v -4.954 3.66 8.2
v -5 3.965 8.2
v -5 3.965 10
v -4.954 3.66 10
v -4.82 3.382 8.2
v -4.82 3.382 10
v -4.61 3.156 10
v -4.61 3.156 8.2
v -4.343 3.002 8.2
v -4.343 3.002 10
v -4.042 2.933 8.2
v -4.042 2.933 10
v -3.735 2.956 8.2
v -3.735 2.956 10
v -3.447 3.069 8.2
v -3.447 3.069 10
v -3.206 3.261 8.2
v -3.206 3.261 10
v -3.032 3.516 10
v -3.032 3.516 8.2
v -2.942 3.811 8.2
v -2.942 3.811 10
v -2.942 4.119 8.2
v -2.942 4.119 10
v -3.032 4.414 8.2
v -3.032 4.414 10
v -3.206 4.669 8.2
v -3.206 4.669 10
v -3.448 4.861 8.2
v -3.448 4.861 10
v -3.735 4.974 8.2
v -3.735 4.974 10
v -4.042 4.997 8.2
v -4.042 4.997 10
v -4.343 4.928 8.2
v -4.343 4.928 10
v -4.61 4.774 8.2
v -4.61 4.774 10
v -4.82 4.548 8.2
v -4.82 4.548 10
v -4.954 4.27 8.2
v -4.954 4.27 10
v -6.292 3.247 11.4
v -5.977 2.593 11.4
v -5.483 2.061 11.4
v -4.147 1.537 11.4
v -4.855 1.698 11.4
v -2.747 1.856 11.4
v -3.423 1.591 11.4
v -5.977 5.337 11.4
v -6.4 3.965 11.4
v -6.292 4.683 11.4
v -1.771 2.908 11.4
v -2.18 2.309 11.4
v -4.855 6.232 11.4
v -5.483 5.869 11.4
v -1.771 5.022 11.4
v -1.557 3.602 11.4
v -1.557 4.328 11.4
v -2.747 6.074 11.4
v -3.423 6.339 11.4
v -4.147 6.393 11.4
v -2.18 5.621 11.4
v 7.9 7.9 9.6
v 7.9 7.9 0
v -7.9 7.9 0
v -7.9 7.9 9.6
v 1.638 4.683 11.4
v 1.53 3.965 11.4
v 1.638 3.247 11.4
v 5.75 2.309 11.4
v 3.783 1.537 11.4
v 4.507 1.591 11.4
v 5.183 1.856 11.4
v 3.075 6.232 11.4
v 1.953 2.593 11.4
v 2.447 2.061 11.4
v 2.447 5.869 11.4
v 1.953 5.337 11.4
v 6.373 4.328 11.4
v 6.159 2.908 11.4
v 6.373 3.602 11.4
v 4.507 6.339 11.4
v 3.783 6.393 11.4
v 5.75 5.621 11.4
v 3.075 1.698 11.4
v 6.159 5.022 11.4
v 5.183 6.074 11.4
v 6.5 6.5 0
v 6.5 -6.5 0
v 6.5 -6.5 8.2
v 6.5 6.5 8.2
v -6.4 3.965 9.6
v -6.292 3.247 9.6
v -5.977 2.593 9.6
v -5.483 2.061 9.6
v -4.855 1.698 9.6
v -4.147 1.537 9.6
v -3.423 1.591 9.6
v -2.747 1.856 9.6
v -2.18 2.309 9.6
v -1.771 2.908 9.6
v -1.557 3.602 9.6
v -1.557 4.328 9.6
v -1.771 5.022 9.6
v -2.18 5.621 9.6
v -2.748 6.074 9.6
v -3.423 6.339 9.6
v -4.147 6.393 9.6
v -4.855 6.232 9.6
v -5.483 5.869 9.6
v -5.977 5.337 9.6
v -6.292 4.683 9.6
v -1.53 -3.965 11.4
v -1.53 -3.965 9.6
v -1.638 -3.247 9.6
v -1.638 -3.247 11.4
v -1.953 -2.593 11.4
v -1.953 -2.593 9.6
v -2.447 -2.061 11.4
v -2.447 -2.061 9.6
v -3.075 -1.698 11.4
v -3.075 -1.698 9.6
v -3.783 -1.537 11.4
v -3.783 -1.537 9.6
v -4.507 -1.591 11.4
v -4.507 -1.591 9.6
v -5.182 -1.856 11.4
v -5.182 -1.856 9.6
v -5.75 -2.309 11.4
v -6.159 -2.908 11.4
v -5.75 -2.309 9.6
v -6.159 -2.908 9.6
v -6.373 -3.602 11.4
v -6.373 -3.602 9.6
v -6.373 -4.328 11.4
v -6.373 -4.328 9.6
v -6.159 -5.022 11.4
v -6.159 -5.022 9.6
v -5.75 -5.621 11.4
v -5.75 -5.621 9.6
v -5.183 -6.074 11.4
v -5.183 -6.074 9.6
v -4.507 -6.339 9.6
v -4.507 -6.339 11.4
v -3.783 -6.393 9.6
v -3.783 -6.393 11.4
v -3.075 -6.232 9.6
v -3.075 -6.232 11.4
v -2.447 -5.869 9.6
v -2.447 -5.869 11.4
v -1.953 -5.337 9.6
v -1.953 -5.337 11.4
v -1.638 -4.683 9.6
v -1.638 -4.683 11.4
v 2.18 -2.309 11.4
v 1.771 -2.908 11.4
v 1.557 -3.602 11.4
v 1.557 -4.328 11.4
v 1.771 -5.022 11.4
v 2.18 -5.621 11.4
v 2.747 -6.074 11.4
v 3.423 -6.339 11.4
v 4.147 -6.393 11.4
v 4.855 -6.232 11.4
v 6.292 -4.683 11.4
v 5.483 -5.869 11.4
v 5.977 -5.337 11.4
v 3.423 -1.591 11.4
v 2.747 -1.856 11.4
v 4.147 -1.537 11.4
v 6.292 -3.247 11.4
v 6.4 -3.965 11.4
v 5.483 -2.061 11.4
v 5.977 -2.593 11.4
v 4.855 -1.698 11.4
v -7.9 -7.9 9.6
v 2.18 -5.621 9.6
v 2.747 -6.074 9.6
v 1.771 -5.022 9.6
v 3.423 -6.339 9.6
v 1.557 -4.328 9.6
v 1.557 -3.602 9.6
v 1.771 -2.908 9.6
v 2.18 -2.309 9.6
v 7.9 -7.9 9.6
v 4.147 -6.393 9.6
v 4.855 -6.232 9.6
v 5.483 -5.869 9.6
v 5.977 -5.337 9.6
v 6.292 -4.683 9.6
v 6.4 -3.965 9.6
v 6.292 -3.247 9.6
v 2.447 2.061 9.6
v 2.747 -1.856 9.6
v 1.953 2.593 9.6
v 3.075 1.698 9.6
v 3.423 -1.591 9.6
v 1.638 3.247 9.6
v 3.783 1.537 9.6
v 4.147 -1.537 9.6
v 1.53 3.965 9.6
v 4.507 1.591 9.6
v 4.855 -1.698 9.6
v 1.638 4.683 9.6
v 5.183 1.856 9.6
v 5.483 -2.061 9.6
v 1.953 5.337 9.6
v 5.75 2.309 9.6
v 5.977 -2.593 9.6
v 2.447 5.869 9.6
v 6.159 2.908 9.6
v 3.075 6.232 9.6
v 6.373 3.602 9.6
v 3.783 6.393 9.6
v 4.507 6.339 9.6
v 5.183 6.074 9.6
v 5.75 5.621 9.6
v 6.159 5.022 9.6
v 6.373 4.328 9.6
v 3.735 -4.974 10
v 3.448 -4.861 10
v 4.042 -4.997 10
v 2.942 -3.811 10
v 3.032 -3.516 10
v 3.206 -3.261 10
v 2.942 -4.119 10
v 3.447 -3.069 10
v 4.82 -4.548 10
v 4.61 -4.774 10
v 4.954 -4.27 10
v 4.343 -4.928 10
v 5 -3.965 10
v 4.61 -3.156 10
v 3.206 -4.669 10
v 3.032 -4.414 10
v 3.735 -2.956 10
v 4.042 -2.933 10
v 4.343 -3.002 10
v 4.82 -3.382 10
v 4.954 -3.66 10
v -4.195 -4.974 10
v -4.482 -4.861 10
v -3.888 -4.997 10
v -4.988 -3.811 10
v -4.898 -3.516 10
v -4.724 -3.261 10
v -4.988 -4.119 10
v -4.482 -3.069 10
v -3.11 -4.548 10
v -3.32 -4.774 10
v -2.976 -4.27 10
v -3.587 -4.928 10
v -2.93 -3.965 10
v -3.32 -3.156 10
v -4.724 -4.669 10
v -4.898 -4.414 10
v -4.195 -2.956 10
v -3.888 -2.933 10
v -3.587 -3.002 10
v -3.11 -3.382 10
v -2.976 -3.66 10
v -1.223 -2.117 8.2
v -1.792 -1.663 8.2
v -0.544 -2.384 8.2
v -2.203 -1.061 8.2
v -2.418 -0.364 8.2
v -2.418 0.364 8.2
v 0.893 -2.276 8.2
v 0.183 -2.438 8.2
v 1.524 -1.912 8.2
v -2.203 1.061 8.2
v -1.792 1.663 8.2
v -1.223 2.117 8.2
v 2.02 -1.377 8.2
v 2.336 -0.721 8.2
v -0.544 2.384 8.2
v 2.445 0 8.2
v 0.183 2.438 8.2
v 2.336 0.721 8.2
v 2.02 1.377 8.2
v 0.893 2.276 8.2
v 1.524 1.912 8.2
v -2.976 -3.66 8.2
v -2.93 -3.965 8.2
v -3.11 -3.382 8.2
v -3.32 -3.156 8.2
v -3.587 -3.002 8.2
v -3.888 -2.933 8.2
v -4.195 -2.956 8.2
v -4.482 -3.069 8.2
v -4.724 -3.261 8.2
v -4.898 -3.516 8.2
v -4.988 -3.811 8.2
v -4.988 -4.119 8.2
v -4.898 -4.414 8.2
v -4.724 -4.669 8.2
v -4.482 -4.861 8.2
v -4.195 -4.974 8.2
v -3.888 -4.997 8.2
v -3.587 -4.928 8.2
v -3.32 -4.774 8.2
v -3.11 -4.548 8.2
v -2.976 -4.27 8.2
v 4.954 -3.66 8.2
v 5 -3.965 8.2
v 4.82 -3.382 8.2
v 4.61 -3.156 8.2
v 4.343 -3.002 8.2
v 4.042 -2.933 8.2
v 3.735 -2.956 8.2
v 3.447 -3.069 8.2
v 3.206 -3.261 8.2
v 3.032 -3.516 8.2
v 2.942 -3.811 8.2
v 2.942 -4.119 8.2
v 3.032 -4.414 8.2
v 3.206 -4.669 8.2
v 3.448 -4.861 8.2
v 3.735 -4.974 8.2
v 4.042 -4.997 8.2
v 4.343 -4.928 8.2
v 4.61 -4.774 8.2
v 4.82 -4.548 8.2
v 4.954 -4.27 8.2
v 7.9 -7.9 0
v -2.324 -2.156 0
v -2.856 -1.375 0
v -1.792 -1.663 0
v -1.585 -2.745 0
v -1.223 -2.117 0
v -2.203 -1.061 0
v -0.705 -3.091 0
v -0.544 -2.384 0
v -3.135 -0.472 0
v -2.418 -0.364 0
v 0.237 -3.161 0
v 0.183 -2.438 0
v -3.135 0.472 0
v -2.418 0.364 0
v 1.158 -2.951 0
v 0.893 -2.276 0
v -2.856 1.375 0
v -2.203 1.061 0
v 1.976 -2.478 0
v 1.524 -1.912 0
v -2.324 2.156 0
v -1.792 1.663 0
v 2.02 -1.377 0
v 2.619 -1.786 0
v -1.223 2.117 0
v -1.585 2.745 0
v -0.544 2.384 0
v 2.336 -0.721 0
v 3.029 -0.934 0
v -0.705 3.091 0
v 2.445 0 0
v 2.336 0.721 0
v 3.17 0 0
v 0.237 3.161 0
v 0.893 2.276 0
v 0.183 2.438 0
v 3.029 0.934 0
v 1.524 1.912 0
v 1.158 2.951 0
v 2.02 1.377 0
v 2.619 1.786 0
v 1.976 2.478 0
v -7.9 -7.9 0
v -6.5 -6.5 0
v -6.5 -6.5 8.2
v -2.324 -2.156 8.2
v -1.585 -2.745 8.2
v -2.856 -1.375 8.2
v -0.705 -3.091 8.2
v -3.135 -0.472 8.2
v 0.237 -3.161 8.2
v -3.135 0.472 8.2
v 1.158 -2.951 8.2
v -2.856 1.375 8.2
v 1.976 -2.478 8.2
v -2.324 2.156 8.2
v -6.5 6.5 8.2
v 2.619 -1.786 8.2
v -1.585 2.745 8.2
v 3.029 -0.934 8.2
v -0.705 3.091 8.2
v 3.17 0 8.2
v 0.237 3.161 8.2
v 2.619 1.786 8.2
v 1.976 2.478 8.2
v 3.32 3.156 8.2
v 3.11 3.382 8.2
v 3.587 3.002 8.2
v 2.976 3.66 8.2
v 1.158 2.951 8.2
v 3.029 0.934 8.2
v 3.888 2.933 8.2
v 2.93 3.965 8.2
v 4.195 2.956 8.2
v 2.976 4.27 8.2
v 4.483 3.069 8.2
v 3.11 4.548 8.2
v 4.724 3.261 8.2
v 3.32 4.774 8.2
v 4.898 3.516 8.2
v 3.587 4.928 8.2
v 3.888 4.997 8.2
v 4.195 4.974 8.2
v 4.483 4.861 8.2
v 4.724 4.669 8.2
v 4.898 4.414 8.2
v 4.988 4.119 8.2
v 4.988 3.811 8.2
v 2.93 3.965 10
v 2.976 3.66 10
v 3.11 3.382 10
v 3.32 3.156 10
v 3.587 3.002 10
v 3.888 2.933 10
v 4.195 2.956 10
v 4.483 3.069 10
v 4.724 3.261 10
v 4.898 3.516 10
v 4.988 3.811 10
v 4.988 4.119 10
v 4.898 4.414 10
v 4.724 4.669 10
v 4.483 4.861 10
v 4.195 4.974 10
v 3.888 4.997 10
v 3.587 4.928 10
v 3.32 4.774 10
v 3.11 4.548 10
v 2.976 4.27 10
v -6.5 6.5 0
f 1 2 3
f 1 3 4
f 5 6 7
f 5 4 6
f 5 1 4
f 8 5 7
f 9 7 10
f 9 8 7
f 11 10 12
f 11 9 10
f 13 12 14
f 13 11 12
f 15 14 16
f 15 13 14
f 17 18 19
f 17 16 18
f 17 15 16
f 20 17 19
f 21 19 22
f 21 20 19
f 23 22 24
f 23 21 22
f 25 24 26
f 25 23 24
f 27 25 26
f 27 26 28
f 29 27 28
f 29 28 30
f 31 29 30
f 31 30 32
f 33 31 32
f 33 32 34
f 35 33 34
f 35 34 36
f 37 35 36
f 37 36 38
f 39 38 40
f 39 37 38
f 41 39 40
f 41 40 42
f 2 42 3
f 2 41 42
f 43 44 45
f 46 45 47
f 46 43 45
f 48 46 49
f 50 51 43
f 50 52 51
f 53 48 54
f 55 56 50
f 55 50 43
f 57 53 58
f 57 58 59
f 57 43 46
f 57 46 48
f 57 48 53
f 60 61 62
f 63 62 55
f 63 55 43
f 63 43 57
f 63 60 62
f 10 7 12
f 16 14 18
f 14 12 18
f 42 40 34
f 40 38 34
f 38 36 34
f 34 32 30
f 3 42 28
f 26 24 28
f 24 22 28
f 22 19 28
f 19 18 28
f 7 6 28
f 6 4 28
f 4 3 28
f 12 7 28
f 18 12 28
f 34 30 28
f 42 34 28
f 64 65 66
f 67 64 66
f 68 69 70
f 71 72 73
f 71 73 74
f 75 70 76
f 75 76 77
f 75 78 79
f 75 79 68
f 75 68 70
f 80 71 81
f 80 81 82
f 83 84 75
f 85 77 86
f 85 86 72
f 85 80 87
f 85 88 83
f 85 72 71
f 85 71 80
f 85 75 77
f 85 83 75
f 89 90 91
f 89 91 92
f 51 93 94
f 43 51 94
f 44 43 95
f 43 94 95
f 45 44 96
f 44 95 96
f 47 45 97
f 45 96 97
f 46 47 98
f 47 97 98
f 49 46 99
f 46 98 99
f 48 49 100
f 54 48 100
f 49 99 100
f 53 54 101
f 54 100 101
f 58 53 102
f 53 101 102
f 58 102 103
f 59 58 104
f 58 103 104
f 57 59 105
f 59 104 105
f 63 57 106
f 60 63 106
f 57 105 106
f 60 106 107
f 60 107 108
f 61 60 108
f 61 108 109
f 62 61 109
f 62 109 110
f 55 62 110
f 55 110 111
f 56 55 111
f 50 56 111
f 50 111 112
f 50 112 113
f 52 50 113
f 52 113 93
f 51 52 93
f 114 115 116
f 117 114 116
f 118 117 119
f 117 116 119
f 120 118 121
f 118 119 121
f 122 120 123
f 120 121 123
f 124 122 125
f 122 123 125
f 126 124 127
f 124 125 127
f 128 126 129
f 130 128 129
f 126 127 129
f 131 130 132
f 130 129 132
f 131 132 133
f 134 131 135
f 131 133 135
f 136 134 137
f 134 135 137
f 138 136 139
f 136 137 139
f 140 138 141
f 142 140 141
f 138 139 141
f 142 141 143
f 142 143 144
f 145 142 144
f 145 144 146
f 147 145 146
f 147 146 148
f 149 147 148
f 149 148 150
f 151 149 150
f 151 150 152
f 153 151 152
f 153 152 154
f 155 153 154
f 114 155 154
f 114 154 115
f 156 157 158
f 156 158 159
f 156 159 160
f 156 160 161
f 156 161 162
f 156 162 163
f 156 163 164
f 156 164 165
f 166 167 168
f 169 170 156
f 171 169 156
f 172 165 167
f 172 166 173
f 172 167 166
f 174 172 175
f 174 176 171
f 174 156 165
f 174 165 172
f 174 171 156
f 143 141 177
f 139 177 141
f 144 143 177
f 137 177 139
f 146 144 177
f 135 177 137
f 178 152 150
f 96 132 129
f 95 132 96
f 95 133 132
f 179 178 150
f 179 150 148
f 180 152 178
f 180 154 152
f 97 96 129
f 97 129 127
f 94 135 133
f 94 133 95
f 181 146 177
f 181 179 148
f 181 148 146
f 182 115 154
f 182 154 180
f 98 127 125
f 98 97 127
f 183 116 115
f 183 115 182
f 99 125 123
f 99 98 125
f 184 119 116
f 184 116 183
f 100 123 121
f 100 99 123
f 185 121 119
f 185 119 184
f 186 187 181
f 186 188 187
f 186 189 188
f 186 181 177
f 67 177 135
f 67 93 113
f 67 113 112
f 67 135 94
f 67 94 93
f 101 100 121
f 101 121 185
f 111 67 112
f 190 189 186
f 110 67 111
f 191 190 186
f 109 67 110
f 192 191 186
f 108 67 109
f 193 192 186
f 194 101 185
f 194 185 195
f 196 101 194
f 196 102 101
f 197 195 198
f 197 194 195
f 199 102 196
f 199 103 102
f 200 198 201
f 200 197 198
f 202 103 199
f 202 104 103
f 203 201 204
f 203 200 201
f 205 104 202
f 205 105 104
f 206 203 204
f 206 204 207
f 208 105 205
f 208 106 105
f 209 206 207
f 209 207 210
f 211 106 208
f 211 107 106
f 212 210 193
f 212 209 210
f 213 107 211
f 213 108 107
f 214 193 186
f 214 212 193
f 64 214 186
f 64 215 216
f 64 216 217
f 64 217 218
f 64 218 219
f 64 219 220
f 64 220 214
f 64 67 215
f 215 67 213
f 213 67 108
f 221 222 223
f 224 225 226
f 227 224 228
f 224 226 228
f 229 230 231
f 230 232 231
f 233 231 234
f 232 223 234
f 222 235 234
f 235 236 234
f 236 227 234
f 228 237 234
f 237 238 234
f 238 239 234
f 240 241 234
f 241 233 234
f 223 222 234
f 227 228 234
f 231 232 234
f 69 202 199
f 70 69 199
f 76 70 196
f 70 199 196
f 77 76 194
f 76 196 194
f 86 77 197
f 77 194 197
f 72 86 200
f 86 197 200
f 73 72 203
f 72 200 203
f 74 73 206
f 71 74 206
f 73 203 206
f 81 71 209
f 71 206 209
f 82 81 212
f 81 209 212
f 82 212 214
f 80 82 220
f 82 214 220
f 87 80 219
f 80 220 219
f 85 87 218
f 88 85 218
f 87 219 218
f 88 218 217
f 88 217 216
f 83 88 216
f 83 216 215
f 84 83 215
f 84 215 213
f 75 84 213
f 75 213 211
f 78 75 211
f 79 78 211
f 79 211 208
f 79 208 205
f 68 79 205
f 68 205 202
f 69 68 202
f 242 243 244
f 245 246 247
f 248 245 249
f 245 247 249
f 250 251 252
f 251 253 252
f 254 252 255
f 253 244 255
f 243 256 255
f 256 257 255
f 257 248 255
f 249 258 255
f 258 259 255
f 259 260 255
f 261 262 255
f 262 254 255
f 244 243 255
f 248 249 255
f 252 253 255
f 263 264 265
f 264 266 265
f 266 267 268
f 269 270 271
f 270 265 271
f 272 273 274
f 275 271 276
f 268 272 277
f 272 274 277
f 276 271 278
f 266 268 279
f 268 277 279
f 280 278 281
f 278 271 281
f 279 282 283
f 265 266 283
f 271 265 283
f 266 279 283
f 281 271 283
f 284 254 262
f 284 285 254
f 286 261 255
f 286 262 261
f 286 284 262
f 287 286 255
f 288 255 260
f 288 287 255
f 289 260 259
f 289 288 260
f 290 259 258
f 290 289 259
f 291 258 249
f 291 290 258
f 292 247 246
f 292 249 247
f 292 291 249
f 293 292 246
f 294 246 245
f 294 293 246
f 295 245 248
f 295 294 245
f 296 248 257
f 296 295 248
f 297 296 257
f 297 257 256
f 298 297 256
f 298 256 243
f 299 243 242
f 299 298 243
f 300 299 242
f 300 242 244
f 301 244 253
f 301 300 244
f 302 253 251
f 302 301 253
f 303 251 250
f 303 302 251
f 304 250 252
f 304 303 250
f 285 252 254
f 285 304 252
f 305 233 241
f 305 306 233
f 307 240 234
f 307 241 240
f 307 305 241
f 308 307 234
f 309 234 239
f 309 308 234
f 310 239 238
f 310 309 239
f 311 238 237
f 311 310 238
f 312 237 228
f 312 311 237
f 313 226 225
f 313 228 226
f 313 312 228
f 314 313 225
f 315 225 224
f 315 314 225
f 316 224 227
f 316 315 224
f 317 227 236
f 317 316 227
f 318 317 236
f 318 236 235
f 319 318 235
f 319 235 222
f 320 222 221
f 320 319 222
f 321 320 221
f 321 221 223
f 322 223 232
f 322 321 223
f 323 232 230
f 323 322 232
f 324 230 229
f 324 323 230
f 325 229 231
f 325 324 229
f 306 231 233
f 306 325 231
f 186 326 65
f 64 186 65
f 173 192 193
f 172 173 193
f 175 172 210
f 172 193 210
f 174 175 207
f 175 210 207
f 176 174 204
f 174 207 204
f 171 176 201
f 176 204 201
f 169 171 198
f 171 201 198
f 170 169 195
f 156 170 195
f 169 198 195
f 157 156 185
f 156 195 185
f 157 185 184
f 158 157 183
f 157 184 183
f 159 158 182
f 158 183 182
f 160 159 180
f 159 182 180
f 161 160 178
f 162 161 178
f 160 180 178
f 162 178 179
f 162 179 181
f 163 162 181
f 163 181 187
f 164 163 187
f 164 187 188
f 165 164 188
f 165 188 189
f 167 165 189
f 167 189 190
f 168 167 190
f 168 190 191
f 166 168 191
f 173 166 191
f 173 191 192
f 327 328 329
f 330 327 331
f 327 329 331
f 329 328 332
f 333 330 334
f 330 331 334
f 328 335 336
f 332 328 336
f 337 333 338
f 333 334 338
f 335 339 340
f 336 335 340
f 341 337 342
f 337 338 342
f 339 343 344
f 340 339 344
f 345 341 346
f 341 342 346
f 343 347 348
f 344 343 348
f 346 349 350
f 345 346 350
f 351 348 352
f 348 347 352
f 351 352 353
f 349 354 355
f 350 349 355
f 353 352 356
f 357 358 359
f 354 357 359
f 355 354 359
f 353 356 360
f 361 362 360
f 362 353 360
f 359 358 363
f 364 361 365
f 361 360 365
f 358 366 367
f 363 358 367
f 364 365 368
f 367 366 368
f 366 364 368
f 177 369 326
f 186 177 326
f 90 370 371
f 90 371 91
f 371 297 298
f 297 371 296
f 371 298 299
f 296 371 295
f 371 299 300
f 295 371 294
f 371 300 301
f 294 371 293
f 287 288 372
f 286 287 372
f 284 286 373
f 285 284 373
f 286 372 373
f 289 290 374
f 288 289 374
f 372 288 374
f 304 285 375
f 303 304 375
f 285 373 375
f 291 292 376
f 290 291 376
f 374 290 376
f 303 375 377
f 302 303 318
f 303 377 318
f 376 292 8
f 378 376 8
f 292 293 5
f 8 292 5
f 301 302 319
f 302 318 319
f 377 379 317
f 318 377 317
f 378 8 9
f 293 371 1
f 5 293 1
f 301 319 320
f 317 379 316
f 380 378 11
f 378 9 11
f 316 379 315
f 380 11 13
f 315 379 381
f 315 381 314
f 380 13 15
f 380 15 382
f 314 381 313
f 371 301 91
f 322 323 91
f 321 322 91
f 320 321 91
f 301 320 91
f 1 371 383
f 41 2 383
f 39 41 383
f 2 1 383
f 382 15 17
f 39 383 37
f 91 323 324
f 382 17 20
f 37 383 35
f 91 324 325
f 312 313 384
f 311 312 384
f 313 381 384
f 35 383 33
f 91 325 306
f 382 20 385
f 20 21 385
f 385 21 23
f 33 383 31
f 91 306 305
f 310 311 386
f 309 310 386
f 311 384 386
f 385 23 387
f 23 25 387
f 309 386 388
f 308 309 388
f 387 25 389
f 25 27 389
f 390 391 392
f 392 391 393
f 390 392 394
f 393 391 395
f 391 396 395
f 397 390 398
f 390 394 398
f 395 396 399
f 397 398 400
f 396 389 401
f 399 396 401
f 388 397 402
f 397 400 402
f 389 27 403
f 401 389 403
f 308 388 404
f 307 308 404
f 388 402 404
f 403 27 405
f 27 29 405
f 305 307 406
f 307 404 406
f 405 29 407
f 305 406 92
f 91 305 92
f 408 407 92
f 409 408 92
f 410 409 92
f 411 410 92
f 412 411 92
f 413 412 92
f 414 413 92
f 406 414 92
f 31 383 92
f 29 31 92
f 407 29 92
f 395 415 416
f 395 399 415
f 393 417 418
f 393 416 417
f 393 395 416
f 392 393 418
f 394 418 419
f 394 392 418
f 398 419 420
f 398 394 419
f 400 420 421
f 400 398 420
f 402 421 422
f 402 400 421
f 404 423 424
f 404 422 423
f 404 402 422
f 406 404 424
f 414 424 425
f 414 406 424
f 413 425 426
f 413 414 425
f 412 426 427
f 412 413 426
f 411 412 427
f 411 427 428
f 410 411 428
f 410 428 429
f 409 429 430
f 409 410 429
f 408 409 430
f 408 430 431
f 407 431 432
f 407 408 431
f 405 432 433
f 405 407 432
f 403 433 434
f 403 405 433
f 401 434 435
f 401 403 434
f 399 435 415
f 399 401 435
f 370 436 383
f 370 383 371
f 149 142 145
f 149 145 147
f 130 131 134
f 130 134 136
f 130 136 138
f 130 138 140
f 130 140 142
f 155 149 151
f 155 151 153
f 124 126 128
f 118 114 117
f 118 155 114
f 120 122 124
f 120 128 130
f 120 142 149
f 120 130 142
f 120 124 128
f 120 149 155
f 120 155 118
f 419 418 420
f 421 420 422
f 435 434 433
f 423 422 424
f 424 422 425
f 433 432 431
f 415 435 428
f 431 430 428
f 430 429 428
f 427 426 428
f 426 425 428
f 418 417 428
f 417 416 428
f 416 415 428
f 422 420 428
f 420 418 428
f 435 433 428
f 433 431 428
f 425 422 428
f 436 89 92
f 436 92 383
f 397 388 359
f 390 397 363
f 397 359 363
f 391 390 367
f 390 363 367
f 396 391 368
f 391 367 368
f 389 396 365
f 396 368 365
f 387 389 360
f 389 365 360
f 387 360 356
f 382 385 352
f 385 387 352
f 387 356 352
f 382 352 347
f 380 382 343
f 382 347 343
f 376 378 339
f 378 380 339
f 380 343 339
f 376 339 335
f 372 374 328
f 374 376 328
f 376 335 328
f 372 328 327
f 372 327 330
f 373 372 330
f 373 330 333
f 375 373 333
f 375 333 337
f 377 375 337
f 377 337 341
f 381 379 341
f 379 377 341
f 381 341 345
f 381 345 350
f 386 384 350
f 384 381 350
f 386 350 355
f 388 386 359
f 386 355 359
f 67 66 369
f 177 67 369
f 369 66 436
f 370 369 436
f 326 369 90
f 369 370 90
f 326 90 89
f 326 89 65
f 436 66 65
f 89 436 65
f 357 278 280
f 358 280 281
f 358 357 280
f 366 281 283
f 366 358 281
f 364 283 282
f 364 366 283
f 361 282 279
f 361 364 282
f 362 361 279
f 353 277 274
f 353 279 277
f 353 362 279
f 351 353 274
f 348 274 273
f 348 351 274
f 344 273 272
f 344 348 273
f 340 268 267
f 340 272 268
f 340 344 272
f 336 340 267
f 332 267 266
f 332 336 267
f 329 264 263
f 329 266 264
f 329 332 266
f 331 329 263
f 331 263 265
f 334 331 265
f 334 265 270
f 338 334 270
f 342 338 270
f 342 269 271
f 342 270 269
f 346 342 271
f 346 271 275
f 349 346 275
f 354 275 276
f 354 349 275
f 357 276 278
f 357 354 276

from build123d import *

# Parameters (mm, degrees)
F0_R     = 2.435
F1_DEPTH = 9.6
F2_DEPTH = 11.4
F3_T     = -1.4
F4_R     = 3.17
F4_R_2   = 2.445
F5_DEPTH = 9.5


with BuildPart() as f1:
    # F0 (on Top) → F1 (new body)
    with BuildSketch(Plane.XY):
        Polygon((7.9, 7.9), (-7.9, 7.9), (-7.9, 3.965), (-7.9, -7.9), (7.9, -7.9), align=None)
        with Locations((-3.965, -3.965)):
            Circle(F0_R, mode=Mode.SUBTRACT)
        with Locations((3.965, -3.965)):
            Circle(F0_R, mode=Mode.SUBTRACT)
        with BuildLine():
            ThreePointArc((-1.53, 3.965), (-3.965, 1.53), (-6.4, 3.965))
            ThreePointArc((-6.4, 3.965), (-3.965, 6.4), (-1.53, 3.965))
        make_face(mode=Mode.SUBTRACT)
        with BuildLine():
            ThreePointArc((6.4, 3.965), (3.965, 1.53), (1.53, 3.965))
            ThreePointArc((1.53, 3.965), (3.965, 6.4), (6.4, 3.965))
        make_face(mode=Mode.SUBTRACT)
    extrude(amount=F1_DEPTH)

    # F0 (on Top) → F2 (join)
    with BuildSketch(Plane.XY):
        with BuildLine():
            ThreePointArc((-1.53, 3.965), (-3.965, 6.4), (-6.4, 3.965))
            ThreePointArc((-6.4, 3.965), (-3.965, 1.53), (-1.53, 3.965))
        make_face()
        with BuildLine():
            ThreePointArc((6.4, 3.965), (3.965, 6.4), (1.53, 3.965))
            ThreePointArc((1.53, 3.965), (3.965, 1.53), (6.4, 3.965))
        make_face()
        with Locations((3.965, -3.965)):
            Circle(F0_R)
        with Locations((-3.965, -3.965)):
            Circle(F0_R)
    extrude(amount=F2_DEPTH)

    # F3
    f3_openings = [f1.faces().sort_by_distance(p)[0] for p in [
        (0, 0, 0),
    ]]
    offset(amount=F3_T, openings=f3_openings, kind=Kind.INTERSECTION)

    # F4 (on face) → F5 (join)
    with BuildSketch(Plane.XY):
        Circle(F4_R)
        Circle(F4_R_2, mode=Mode.SUBTRACT)
    extrude(amount=F5_DEPTH)


solid = f1.part
